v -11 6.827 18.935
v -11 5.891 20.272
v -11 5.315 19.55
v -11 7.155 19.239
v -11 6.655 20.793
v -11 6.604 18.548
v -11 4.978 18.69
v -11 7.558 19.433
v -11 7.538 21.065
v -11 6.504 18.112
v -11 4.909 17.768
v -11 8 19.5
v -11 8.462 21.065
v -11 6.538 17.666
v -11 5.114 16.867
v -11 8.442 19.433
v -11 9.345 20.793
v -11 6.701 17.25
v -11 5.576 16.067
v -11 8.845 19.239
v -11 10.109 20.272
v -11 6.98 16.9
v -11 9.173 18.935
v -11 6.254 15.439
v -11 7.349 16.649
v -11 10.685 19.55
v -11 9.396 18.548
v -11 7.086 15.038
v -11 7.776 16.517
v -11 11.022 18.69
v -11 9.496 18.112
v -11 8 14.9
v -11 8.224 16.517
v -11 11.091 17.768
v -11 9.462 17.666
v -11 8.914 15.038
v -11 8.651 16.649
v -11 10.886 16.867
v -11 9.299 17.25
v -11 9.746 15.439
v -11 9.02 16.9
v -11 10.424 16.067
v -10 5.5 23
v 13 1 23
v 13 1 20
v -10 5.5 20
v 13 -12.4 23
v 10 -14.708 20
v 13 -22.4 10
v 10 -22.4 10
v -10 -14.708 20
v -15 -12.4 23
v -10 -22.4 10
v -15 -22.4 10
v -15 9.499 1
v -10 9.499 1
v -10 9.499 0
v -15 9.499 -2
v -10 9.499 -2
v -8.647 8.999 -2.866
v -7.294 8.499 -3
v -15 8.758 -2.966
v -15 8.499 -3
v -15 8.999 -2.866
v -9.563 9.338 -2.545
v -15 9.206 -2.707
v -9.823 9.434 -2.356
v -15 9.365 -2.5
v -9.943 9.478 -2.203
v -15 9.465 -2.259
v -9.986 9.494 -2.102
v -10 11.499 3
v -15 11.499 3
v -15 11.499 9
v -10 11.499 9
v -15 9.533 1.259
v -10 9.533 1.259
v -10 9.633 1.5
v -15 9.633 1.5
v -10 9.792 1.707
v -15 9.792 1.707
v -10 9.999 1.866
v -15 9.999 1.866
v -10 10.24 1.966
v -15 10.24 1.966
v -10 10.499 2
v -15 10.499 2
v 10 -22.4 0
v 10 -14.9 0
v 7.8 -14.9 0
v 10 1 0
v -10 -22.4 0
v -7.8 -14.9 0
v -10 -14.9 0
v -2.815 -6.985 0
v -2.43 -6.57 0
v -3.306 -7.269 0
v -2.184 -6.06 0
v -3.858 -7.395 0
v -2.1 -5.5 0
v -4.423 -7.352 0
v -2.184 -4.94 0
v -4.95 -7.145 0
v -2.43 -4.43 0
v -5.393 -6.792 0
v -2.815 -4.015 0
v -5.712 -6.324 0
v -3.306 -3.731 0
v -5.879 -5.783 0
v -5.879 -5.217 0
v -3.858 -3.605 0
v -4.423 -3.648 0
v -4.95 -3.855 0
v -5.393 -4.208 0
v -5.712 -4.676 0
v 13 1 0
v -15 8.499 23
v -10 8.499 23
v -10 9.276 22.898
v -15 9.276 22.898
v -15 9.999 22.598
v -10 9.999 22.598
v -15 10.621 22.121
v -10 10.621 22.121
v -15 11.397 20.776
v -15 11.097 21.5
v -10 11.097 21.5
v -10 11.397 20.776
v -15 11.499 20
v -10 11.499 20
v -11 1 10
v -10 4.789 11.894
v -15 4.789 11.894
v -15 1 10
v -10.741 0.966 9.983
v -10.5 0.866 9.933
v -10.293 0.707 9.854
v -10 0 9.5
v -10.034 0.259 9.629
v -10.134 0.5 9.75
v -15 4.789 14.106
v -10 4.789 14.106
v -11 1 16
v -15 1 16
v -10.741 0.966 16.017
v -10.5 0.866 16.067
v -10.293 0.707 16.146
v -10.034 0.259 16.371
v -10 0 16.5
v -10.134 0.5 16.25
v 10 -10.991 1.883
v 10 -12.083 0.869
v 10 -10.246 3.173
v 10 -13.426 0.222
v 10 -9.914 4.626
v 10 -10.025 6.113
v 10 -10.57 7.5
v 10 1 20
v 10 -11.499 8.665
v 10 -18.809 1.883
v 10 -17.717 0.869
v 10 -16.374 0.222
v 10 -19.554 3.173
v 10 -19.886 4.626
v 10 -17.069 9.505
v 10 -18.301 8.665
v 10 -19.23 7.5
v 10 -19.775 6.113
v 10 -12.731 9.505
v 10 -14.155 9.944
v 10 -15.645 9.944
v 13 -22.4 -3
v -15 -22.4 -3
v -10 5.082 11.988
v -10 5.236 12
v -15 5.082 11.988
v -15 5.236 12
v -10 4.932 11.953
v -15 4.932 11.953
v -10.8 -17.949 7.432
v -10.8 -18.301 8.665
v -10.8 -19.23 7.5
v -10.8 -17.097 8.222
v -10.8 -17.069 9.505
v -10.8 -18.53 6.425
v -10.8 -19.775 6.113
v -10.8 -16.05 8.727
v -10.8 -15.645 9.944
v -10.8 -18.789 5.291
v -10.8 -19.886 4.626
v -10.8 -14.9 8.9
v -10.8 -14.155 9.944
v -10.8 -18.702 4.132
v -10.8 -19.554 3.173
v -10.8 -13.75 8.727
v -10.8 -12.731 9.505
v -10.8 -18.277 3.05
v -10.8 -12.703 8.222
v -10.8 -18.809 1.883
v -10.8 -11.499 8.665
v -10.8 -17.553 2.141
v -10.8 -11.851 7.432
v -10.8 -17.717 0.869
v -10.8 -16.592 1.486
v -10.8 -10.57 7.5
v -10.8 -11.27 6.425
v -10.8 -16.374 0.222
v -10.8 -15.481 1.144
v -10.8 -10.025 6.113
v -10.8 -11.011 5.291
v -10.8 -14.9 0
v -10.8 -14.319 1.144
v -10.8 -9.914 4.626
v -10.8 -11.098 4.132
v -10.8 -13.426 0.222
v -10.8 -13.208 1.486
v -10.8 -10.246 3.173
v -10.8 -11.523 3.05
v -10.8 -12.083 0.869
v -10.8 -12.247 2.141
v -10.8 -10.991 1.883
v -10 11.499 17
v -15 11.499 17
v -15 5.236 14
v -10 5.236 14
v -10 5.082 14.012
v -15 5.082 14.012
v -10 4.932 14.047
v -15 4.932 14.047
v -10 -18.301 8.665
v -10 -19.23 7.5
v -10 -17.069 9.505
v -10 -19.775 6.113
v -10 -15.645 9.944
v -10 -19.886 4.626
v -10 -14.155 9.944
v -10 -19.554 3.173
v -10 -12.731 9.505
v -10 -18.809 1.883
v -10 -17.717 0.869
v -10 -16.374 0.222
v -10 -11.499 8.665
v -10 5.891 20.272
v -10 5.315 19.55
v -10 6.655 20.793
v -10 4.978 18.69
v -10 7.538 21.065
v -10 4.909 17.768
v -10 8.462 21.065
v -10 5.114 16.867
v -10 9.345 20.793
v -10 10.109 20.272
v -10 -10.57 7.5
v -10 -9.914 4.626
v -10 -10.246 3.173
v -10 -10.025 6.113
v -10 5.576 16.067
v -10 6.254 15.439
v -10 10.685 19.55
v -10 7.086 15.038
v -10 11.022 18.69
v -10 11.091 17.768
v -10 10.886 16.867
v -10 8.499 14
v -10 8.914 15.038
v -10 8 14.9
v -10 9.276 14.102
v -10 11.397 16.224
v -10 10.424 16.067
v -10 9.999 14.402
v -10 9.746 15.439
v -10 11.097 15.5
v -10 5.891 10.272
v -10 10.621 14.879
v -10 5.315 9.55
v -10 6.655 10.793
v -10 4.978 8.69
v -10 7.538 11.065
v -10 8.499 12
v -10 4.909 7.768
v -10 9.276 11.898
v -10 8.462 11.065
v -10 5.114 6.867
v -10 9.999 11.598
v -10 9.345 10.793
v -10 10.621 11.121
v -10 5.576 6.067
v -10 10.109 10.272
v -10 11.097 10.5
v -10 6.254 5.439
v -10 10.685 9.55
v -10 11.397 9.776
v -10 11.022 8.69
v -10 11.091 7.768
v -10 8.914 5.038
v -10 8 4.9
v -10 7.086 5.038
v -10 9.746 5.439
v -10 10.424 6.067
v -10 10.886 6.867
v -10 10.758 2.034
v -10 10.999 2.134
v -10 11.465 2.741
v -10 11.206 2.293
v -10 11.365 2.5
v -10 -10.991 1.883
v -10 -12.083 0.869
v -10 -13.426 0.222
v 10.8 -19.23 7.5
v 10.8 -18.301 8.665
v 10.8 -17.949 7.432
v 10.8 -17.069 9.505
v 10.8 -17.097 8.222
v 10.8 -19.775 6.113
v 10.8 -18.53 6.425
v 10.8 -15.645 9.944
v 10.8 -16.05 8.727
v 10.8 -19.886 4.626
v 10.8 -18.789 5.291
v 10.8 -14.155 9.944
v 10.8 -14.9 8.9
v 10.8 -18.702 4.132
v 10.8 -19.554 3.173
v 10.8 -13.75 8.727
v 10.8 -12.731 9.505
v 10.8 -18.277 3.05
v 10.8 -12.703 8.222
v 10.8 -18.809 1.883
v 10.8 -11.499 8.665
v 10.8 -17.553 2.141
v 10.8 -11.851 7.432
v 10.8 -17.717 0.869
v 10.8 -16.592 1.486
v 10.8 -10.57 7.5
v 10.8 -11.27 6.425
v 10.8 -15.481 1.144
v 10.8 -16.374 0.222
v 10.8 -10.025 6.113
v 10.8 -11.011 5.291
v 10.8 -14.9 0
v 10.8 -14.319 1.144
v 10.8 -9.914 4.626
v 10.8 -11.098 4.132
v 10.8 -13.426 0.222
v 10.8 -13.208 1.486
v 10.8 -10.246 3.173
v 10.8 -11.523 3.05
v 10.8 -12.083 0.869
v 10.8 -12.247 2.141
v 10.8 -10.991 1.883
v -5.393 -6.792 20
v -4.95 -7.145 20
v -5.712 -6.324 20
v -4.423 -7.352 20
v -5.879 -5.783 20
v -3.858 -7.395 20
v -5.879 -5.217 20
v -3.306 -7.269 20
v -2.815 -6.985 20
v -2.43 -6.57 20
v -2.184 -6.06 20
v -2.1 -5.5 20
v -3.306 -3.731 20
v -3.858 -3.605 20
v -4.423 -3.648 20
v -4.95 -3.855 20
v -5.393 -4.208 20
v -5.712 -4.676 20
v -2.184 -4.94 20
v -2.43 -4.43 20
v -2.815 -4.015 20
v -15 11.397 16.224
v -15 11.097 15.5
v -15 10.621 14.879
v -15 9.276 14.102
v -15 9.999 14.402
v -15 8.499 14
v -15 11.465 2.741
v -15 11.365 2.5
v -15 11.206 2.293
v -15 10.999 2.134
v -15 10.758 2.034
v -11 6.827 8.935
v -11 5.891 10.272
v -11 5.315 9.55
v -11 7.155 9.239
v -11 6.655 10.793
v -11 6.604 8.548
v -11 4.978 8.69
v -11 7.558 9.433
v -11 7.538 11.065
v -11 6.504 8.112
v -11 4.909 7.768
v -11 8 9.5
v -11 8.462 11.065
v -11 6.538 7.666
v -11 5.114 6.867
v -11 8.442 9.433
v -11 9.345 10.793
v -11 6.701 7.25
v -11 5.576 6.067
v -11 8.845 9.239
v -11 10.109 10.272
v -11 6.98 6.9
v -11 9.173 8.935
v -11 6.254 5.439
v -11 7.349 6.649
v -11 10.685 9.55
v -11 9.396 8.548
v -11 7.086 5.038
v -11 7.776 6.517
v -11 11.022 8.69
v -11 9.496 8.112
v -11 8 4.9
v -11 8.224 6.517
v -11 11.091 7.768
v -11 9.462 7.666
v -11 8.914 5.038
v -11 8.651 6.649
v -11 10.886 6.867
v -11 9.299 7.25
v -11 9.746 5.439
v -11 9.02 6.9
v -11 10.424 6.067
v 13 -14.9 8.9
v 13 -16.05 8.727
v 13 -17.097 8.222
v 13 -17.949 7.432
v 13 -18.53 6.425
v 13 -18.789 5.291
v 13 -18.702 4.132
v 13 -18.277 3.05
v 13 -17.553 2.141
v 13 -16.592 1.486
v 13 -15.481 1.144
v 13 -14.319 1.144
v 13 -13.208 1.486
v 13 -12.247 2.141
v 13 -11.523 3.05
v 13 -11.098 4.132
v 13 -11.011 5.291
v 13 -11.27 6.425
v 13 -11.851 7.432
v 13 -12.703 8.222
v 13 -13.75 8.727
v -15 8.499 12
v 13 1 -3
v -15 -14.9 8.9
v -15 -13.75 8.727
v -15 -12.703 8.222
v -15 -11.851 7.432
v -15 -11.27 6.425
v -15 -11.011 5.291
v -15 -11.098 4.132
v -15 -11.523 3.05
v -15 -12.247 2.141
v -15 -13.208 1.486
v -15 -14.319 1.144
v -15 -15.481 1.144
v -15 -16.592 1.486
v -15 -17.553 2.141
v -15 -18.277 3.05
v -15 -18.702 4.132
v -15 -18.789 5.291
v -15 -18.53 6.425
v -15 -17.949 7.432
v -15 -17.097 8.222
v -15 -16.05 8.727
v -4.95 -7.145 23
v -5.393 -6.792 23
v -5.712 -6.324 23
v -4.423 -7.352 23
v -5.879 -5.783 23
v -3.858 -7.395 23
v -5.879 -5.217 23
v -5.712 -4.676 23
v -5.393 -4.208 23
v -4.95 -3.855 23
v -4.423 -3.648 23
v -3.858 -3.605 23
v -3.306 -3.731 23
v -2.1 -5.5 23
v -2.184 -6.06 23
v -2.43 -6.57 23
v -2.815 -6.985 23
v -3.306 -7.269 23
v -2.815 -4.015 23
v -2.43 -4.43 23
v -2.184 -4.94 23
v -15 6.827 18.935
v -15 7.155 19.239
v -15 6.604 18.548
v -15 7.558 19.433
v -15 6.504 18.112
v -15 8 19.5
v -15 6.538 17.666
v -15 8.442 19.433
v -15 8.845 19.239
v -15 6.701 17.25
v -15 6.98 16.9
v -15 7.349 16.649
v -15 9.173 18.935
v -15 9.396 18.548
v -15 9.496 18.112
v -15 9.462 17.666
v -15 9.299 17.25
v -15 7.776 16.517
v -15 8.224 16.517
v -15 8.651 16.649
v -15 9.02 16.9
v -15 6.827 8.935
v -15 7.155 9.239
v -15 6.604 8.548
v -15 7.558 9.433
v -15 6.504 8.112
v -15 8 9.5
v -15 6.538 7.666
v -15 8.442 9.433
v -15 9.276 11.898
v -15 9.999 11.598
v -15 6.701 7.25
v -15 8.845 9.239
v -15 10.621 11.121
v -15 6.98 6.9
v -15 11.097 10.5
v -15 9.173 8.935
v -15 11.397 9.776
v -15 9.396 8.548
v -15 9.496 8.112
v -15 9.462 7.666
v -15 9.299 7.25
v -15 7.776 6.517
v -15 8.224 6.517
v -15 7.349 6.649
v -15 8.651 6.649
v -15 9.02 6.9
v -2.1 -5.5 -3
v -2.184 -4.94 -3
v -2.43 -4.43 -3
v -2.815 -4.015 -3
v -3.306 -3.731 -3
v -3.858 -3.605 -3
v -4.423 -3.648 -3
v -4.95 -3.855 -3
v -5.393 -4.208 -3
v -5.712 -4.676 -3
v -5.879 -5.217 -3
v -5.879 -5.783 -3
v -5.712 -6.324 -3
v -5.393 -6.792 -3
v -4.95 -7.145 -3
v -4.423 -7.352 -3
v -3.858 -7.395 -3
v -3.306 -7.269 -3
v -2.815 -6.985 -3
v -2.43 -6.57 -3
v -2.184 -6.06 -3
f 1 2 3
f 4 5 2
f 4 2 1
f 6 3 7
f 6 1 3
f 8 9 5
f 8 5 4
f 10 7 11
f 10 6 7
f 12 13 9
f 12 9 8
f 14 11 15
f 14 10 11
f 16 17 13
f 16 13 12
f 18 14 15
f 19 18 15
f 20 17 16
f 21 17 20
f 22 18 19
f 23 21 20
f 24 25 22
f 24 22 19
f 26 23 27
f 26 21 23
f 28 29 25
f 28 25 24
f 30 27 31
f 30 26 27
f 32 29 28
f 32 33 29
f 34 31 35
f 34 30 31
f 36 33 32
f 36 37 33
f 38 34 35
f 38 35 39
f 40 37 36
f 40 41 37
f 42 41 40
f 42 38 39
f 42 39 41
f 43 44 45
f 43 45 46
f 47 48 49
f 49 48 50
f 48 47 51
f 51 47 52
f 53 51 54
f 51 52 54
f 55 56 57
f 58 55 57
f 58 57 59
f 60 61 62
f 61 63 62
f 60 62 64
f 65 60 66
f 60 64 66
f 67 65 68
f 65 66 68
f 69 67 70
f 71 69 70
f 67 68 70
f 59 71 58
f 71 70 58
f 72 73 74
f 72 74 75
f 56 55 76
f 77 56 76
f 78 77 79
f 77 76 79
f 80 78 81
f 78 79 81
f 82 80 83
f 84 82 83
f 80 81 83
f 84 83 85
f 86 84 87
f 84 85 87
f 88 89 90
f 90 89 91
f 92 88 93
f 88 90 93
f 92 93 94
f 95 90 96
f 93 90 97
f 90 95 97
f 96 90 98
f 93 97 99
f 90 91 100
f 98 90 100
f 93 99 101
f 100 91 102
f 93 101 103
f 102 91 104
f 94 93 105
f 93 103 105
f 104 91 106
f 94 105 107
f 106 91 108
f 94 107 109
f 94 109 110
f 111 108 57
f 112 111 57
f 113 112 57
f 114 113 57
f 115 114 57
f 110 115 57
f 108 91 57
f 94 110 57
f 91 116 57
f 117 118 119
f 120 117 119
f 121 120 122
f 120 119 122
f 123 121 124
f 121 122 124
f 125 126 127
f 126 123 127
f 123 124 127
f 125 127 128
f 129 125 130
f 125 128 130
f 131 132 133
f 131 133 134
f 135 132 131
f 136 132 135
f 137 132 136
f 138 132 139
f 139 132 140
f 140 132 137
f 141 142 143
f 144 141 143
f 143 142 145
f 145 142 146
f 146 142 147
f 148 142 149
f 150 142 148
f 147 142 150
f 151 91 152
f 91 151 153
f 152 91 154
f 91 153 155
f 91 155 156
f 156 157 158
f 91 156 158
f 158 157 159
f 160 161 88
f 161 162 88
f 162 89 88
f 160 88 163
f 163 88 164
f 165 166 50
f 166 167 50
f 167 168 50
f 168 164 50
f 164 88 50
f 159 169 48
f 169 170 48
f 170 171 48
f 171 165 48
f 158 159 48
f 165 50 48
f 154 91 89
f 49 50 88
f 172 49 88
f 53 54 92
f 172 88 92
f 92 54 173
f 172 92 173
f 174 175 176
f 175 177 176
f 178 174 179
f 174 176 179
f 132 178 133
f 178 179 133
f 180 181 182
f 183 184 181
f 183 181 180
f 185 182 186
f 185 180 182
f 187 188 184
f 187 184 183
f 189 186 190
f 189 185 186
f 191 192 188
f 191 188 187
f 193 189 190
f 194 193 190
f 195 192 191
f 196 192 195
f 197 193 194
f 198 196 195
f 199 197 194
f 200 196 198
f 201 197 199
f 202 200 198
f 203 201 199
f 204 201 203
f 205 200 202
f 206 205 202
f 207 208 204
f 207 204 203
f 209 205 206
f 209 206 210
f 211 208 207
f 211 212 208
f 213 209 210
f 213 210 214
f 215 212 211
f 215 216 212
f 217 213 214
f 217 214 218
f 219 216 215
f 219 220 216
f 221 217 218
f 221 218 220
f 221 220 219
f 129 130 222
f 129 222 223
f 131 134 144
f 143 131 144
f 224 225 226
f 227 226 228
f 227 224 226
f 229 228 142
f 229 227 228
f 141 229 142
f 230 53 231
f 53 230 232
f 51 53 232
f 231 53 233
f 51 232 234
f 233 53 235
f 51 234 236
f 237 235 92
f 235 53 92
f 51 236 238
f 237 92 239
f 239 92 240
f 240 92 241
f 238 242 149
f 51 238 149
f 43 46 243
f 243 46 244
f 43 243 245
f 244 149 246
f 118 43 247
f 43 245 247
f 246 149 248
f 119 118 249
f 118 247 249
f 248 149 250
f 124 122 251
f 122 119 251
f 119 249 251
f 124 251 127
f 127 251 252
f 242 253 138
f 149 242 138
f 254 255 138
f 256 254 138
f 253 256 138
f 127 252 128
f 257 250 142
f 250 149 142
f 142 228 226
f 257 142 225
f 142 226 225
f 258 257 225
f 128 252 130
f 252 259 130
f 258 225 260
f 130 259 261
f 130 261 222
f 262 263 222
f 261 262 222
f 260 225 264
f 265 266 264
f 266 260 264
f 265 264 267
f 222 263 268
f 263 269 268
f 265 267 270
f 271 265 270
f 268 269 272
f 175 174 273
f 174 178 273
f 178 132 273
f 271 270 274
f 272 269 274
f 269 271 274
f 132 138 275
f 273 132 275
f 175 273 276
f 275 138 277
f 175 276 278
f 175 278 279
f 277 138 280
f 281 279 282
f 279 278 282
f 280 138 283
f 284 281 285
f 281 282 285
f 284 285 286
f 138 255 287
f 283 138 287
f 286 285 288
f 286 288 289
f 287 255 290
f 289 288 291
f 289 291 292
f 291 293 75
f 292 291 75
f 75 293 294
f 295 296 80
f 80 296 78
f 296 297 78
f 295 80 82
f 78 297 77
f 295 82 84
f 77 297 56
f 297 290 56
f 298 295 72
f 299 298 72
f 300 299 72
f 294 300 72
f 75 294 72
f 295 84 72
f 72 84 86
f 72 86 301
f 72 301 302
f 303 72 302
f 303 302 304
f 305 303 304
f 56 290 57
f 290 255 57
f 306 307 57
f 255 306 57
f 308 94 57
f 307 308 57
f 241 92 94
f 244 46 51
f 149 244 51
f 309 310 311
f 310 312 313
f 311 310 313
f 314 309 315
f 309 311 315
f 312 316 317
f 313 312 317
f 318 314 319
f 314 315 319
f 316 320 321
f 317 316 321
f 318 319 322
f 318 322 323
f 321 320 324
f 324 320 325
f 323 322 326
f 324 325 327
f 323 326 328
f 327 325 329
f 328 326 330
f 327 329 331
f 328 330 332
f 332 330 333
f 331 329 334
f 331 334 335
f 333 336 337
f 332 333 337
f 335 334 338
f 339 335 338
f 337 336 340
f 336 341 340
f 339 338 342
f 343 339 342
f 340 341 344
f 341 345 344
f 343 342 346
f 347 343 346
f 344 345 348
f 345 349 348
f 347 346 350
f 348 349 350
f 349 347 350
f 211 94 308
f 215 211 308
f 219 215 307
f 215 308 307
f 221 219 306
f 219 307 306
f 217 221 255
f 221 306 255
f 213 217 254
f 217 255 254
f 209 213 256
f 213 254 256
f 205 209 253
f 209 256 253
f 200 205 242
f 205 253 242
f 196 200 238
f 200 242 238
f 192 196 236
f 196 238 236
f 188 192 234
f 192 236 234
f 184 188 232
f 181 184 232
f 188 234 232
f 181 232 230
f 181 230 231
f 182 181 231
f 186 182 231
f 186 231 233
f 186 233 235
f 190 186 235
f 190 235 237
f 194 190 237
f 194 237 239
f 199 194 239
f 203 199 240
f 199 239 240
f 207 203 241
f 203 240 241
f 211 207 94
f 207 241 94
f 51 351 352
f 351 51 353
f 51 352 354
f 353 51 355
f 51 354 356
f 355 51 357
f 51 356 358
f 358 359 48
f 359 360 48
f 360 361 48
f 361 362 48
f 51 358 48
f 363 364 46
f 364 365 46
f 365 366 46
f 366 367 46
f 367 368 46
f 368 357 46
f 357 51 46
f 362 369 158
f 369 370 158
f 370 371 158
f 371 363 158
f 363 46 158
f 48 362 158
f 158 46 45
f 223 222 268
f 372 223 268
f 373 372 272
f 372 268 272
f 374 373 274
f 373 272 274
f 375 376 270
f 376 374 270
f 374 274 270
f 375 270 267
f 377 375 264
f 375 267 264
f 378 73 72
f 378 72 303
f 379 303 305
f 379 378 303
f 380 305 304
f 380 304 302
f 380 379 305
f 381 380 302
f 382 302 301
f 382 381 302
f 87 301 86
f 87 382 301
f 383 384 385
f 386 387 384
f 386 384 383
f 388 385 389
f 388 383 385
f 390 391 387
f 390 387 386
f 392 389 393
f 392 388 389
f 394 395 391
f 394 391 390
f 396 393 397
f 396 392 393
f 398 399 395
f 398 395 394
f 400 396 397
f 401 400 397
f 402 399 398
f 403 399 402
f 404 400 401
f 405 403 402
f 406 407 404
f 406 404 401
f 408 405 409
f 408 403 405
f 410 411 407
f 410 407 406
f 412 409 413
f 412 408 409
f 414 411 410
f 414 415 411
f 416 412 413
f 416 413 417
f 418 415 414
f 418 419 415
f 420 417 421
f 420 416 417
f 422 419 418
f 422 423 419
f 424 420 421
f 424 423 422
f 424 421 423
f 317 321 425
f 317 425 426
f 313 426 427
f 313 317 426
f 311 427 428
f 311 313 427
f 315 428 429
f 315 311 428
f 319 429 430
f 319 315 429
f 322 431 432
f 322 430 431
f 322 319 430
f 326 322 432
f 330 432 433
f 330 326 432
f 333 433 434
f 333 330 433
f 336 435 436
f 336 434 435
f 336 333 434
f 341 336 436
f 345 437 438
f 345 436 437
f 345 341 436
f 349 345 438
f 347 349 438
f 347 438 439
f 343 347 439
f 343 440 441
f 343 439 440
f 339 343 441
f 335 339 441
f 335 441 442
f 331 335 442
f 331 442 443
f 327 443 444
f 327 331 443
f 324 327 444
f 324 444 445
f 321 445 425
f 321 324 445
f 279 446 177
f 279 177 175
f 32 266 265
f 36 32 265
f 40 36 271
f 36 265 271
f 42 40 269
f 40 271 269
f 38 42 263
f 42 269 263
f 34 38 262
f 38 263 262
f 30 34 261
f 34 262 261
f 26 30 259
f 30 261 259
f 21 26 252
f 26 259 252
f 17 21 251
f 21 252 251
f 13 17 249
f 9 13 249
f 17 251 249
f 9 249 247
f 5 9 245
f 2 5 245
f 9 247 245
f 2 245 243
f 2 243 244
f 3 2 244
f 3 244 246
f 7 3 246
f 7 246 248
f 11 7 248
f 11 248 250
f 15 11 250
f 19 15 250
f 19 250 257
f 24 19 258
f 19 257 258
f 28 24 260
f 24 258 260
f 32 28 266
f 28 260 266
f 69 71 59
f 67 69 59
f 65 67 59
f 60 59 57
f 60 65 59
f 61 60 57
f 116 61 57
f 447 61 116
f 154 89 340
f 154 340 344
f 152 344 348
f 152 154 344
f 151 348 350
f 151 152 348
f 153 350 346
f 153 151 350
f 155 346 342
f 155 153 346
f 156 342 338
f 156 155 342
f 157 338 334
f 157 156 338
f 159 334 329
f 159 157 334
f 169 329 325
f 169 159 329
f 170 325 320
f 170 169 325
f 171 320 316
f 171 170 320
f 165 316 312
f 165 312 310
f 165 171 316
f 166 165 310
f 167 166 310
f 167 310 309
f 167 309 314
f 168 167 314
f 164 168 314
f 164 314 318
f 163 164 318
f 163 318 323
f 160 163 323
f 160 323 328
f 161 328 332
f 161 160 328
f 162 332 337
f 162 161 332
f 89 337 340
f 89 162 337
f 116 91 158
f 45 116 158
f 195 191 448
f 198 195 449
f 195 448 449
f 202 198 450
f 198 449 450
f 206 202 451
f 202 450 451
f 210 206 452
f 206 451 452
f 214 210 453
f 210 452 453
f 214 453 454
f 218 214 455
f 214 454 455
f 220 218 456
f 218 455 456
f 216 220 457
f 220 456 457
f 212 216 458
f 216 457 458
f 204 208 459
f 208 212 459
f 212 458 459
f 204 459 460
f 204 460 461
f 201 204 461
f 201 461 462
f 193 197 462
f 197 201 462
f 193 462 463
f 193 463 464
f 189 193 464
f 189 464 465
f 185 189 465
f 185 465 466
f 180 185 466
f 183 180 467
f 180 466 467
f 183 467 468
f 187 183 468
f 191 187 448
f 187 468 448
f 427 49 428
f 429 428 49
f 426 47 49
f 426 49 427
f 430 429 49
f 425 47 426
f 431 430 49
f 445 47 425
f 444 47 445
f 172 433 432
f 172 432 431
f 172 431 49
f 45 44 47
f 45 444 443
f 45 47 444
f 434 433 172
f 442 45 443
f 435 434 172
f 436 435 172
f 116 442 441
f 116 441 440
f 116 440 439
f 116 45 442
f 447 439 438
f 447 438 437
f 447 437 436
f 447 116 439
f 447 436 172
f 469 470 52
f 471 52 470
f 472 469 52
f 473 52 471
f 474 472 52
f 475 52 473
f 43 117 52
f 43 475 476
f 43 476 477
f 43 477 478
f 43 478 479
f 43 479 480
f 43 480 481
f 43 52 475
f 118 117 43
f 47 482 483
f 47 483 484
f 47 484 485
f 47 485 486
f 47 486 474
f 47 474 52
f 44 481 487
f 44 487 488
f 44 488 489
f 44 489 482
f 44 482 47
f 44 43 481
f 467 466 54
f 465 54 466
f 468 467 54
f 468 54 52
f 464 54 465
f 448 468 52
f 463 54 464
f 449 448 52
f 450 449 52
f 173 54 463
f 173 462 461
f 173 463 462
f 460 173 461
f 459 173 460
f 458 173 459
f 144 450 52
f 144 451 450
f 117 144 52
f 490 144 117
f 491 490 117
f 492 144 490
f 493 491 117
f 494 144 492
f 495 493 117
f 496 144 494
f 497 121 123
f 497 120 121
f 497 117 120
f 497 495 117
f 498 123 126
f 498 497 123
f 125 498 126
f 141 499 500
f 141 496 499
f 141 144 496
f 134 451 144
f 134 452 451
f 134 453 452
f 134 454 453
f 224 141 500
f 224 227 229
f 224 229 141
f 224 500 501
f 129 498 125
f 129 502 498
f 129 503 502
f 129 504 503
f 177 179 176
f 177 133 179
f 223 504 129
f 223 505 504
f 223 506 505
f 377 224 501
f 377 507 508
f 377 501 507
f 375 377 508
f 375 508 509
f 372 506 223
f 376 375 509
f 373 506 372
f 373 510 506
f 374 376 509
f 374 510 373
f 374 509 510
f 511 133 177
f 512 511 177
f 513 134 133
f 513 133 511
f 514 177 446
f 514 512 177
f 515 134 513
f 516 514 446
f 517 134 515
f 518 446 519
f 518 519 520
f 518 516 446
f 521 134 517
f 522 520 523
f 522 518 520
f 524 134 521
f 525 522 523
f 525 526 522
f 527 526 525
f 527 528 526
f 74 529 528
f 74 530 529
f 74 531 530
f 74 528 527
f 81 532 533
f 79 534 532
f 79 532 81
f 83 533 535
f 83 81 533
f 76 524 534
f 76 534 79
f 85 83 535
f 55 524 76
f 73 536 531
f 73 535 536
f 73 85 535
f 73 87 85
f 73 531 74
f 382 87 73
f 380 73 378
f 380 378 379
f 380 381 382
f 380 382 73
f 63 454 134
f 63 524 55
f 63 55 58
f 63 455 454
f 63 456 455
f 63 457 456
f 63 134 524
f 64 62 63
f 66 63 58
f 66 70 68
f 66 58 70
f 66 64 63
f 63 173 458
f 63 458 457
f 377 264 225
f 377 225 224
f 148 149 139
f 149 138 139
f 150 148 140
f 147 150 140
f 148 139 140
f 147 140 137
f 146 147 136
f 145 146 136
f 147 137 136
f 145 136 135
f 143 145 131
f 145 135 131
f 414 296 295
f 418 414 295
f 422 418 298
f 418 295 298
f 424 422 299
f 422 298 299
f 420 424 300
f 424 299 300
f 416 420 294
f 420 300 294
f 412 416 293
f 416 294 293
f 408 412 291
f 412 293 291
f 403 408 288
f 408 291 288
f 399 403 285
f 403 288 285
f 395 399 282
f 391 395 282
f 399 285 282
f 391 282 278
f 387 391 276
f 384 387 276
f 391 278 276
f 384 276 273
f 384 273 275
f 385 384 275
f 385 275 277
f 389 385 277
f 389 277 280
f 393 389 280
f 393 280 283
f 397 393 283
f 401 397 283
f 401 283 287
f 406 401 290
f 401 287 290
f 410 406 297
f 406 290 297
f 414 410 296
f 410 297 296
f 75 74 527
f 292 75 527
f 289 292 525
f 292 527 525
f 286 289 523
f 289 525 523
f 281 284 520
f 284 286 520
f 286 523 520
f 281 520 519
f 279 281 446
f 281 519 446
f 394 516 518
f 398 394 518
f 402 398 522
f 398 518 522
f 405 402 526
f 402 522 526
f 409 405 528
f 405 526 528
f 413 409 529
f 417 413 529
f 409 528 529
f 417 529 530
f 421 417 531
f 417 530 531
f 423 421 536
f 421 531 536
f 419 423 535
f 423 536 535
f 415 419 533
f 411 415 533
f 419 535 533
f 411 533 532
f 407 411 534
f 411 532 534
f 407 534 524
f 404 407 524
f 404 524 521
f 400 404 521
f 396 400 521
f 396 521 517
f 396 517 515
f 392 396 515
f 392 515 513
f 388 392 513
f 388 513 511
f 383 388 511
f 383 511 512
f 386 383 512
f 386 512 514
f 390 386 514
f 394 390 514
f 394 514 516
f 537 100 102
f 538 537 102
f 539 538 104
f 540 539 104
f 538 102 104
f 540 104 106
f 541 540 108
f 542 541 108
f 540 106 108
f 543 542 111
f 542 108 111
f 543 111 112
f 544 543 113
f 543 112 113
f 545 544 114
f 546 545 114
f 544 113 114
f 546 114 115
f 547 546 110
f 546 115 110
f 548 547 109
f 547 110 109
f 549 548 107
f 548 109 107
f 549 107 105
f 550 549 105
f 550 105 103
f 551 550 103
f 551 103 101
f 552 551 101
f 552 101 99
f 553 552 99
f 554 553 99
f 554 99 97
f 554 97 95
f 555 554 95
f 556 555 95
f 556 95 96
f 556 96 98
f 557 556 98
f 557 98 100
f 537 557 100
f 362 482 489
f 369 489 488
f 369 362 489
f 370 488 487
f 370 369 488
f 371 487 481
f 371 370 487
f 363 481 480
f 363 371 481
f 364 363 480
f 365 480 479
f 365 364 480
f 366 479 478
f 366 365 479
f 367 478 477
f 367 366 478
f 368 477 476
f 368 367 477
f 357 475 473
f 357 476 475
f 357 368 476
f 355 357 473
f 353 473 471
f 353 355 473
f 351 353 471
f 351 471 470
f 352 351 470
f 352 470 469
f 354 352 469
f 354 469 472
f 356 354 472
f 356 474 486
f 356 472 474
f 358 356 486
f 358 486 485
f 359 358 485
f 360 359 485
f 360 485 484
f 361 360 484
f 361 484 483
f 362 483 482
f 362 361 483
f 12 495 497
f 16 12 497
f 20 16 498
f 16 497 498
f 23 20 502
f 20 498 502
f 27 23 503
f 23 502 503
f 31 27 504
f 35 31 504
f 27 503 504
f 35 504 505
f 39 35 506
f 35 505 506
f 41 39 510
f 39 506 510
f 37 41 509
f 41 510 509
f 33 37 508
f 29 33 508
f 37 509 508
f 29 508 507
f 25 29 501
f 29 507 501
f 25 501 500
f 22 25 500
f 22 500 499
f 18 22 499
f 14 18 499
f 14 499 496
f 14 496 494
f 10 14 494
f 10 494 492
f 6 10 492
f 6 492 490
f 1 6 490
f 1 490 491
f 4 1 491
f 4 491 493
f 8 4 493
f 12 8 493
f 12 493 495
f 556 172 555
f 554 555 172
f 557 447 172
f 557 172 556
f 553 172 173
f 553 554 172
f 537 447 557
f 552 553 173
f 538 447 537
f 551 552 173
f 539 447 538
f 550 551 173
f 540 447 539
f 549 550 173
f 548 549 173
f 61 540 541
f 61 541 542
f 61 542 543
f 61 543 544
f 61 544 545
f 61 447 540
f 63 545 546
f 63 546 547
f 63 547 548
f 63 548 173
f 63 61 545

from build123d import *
from build123d.topology import SkipClean

# Parameters (mm, degrees)
SKETCH_1_W           = 20
SKETCH_1_H           = 57.76596942167697
EXTRUDE_1_DEPTH      = 3
EXTRUDE_2_DEPTH      = 3
CUT_EXTRUDE_1_DEPTH  = 6
SKETCH_8_R           = 4.48
CUT_EXTRUDE_2_DEPTH  = 0.8
SKETCH_9_R           = 1.9
CUT_EXTRUDE_3_DEPTH  = 3.8
SKETCH_12_W          = 26.000000000000007
SKETCH_12_H          = 35.36596942167698
CUT_EXTRUDE_4_DEPTH  = 36.00000000000001
CUT_EXTRUDE_8_DEPTH  = 28.00000000000001
SKETCH_23_W          = 26.000000000000004
SKETCH_23_H          = 26
SKETCH_23_W_2        = 20
SKETCH_23_H_2        = 19.999999999999993
EXTRUDE_7_DEPTH      = 4
SKETCH_24_W          = 20
SKETCH_24_H          = 19.999999999999993
EXTRUDE_8_DEPTH      = 3
SKETCH_25_W          = 5.000000000000002
SKETCH_25_H          = 16
SKETCH_25_R          = 1.4999999999999991
EXTRUDE_9_DEPTH      = 3
FILLET_1_R           = 1
CUT_EXTRUDE_9_DEPTH  = 3
SKETCH_27_R          = 1.4999999999999987
CUT_EXTRUDE_10_DEPTH = 3
SKETCH_28_W          = 20
SKETCH_28_H          = 19.999999999999993
CUT_EXTRUDE_11_DEPTH = 10
CUT_EXTRUDE_12_DEPTH = 42.00000000000001
SKETCH_31_R          = 4.48
SKETCH_31_R_2        = 3.98
EXTRUDE_13_DEPTH     = 0.8
SKETCH_32_R          = 5.000000000000001
SKETCH_32_R_2        = 3.98
CUT_EXTRUDE_13_DEPTH = 0.8
SKETCH_33_R          = 4.48
EXTRUDE_14_DEPTH     = 3
SKETCH_36_R          = 5.000000000000001
CUT_EXTRUDE_14_DEPTH = 3
SKETCH_37_R          = 3.98
SKETCH_37_R_2        = 3.900000000000001
EXTRUDE_17_DEPTH     = 0.8
SKETCH_38_R          = 1.5000000000000009
EXTRUDE_18_DEPTH     = 3
SKETCH_39_W          = 4.187599959799879
SKETCH_39_H          = 1.3608825238343043
EXTRUDE_19_DEPTH     = 3
EXTRUDE_START        = 2
SKETCH_43_R          = 1.5000000000000024
SKETCH_43_R_2        = 1.5000000000000009
SKETCH_43_R_3        = 3.900000000000002
EXTRUDE_22_DEPTH     = 2
SKETCH_44_W          = 5
SKETCH_44_H          = 9.399224841629362
EXTRUDE_23_DEPTH     = 2
EXTRUDE_24_DEPTH     = 3
SKETCH_47_W          = 5
SKETCH_47_H          = 9.399224841629362
EXTRUDE_25_DEPTH     = 8
SKETCH_51_W          = 5
SKETCH_51_H          = 14
SKETCH_51_H_2        = 7.999999999999998
EXTRUDE_28_DEPTH     = 1.1
CUT_EXTRUDE_16_DEPTH = 6.1000000000000005
FILLET_START         = -16
FILLET_9_DEPTH       = 7
FILLET_START_2       = -15
FILLET_9_2_DEPTH     = 5
EXTRUDE_30_DEPTH     = 3
FILLET_10_R          = 1
SKETCH_57_W          = 5
SKETCH_57_H          = 10.499224841629362
EXTRUDE_31_DEPTH     = 1
SKETCH_58_W          = 5
SKETCH_58_H          = 10.499224841629362
EXTRUDE_32_DEPTH     = 1
FILLET_11_R          = 3
CUT_EXTRUDE_19_DEPTH = 6.500000000000001
FILLET_14_R          = 1
FILLET_19_R          = 1
SKETCH_62_R          = 3.1000000000000005
CUT_EXTRUDE_20_DEPTH = 1


with BuildPart() as part:
    # 草图1 → 凸台-拉伸1 (new body)
    with BuildSketch(Plane.XY):
        with Locations((0, -28.882984710838485)):
            Rectangle(SKETCH_1_W, SKETCH_1_H)
    extrude_1 = extrude(amount=-EXTRUDE_1_DEPTH)

    # 草图2 → 凸台-拉伸2 (add)
    with BuildSketch(Plane.ZY.offset(10)):
        Polygon((-3, -1.22e-15), (23, 0), (23.000000000000007, -57.76596942167697), (-3, -57.76596942167697), align=None)
    extrude_2 = extrude(amount=EXTRUDE_2_DEPTH)

    # 草图7 → 切除-拉伸1 (cut)
    with BuildSketch(Plane(origin=(-10, 0, 0), x_dir=(0, 0, -1), z_dir=(1, 0, 0))):
        with BuildLine():
            ThreePointArc((-1.0999999999999996, -14.899999999999997), (-5, -10.999999999999996), (-8.9, -14.899999999999997))
            Line((-8.9, -14.899999999999997), (-1.1000000000000014, -14.899999999999997))
        make_face()
        with BuildLine():
            Line((-1.1000000000000014, -14.899999999999997), (-8.9, -14.899999999999997))
            ThreePointArc((-8.9, -14.899999999999997), (-5.000000000000001, -18.799999999999997), (-1.0999999999999996, -14.899999999999999))
        make_face()
    cut_extrude_1 = extrude(amount=-CUT_EXTRUDE_1_DEPTH, mode=Mode.SUBTRACT)

    # 草图8 → 切除-拉伸2 (cut)
    with BuildSketch(Plane.ZY.offset(13.000000000000002)):
        with Locations((5, -14.899999999999997)):
            Circle(SKETCH_8_R)
    cut_extrude_2 = extrude(amount=-CUT_EXTRUDE_2_DEPTH, mode=Mode.SUBTRACT)

    # 草图9 → 切除-拉伸3 (cut)
    with BuildSketch(Plane.XY):
        with Locations((-4, -5.499999999999998)):
            Circle(SKETCH_9_R)
    cut_extrude_3 = extrude(amount=-CUT_EXTRUDE_3_DEPTH, mode=Mode.SUBTRACT)

    # 镜向1: 凸台-拉伸2 across plane
    add(extrude_2.mirror(Plane(origin=(0, 0, 0), x_dir=(0, 0, 1), z_dir=(1, 0, 0))))

    # 镜向2: 切除-拉伸1, 切除-拉伸2 across plane
    add(cut_extrude_1.mirror(Plane(origin=(0, 0, 0), x_dir=(0, 0, 1), z_dir=(1, 0, 0))), mode=Mode.SUBTRACT)
    add(cut_extrude_2.mirror(Plane(origin=(0, 0, 0), x_dir=(0, 0, 1), z_dir=(1, 0, 0))), mode=Mode.SUBTRACT)

    # 镜向3: 凸台-拉伸1 across plane
    add(extrude_1.mirror(Plane.XY.offset(10)))

    # 镜向5: 切除-拉伸3 across plane
    add(cut_extrude_3.mirror(Plane.XY.offset(10)), mode=Mode.SUBTRACT)

    # 草图12 → 切除-拉伸4 (cut)
    with BuildSketch(Plane(origin=(13.000000000000002, 0, 0), x_dir=(0, 0, -1), z_dir=(1, 0, 0))):
        with Locations((-10.000000000000004, -40.08298471083848)):
            Rectangle(SKETCH_12_W, SKETCH_12_H)
    extrude(amount=-CUT_EXTRUDE_4_DEPTH, mode=Mode.SUBTRACT)

    # 草图22 → 切除-拉伸8 (cut)
    with BuildSketch(Plane(origin=(13.000000000000002, 0, 0), x_dir=(0, 0, -1), z_dir=(1, 0, 0))):
        Polygon((-23.000000000000007, -12.399999999999997), (-23.000000000000007, -22.399999999999995), (-10.000000000000007, -22.399999999999995), align=None)
    extrude(amount=-CUT_EXTRUDE_8_DEPTH, mode=Mode.SUBTRACT)

    # 草图23 → 凸台-拉伸7 (add)
    with BuildSketch(Plane(origin=(0, 0, 0), x_dir=(1, 0, 0), z_dir=(0, 1, 0))):
        with Locations((0, -10)):
            Rectangle(SKETCH_23_W, SKETCH_23_H)
        with Locations((0, -9.999999999999996)):
            Rectangle(SKETCH_23_W_2, SKETCH_23_H_2, mode=Mode.SUBTRACT)
    extrude(amount=EXTRUDE_7_DEPTH)

    # 草图24 → 凸台-拉伸8 (add)
    with BuildSketch(Plane(origin=(0, 4, 0), x_dir=(1, 0, 0), z_dir=(0, 1, 0))):
        with Locations((0, -9.999999999999996)):
            Rectangle(SKETCH_24_W, SKETCH_24_H)
    extrude(amount=-EXTRUDE_8_DEPTH)

    # 草图25 → 凸台-拉伸9 (add)
    with BuildSketch(Plane(origin=(0, 4, 0), x_dir=(1, 0, 0), z_dir=(0, 1, 0))):
        with Locations((15.500000000000004, -15)):
            Rectangle(SKETCH_25_W, SKETCH_25_H)
        with Locations(Location((15.500000000000002, -20.23329325648959, 0), (0, 0, 270))):
            Circle(SKETCH_25_R, mode=Mode.SUBTRACT)
        with Locations(Location((15.500000000000002, -10.23329325648959, 0), (0, 0, 270))):
            Circle(SKETCH_25_R, mode=Mode.SUBTRACT)
    extrude(amount=-EXTRUDE_9_DEPTH)

    # 圆角1
    fillet_1_edges = [part.edges().sort_by_distance(p)[0] for p in [
        (18.000000000000004, 1, 15),
    ]]
    fillet(fillet_1_edges, radius=FILLET_1_R)

    # 草图26 → 切除-拉伸9 (cut)
    with BuildSketch(Plane(origin=(13.000000000000002, 0, 0), x_dir=(0, 0, -1), z_dir=(1, 0, 0))):
        with BuildLine():
            Line((-16, 1.0000000000000004), (-13.999999999999998, 1.0000000000000004))
            ThreePointArc((-13.999999999999998, 1.0000000000000004), (-15, 0), (-16, 1.0000000000000004))
        make_face()
    extrude(amount=-CUT_EXTRUDE_9_DEPTH, mode=Mode.SUBTRACT)

    # 草图27 → 切除-拉伸10 (cut)
    with BuildSketch(Plane(origin=(0, 4, 0), x_dir=(1, 0, 0), z_dir=(0, 1, 0))):
        with Locations(Location((7.500000000000002, -15.233293256489592, 0), (0, 0, 270))):
            Circle(SKETCH_27_R)
    extrude(amount=-CUT_EXTRUDE_10_DEPTH, mode=Mode.SUBTRACT)

    # 草图28 → 切除-拉伸11 (cut)
    with BuildSketch(Plane.XZ.offset(-1)):
        with Locations((0, 9.999999999999996)):
            Rectangle(SKETCH_28_W, SKETCH_28_H)
    extrude(amount=-CUT_EXTRUDE_11_DEPTH, mode=Mode.SUBTRACT)

    # 草图29 → 切除-拉伸12 (cut)
    with BuildSketch(Plane(origin=(0, 0, -3), x_dir=(-1, 0, 0), z_dir=(0, 0, -1))):
        Polygon((13.000000000000002, 4), (-24.68163228941081, 4), (-24.68163228941081, 0.9999999999999957), (13.000000000000002, 1.0000000000000002), align=None)
    extrude(amount=-CUT_EXTRUDE_12_DEPTH, mode=Mode.SUBTRACT)

    # 草图31 → 凸台-拉伸13 (add)
    with BuildSketch(Plane.ZY.offset(12.200000000000001)):
        with Locations((5, -14.899999999999997)):
            Circle(SKETCH_31_R)
        with Locations((5, -14.899999999999997)):
            Circle(SKETCH_31_R_2, mode=Mode.SUBTRACT)
    extrude(amount=EXTRUDE_13_DEPTH)

    # 草图32 → 切除-拉伸13 (cut)
    with BuildSketch(Plane(origin=(-10, 0, 0), x_dir=(0, 0, -1), z_dir=(1, 0, 0))):
        with Locations((-5, -14.899999999999997)):
            Circle(SKETCH_32_R)
        with Locations(Location((-5, -14.899999999999997, 0), (0, 0, 180))):
            Circle(SKETCH_32_R_2, mode=Mode.SUBTRACT)
    cut_extrude_13 = extrude(amount=-CUT_EXTRUDE_13_DEPTH, mode=Mode.SUBTRACT)

    # 草图33 → 凸台-拉伸14 (add)
    with BuildSketch(Plane(origin=(13.000000000000002, 0, 0), x_dir=(0, 0, -1), z_dir=(1, 0, 0))):
        with Locations((-5, -14.899999999999997)):
            Circle(SKETCH_33_R)
    extrude(amount=-EXTRUDE_14_DEPTH)

    # 镜向6: 切除-拉伸1, 切除-拉伸13 across plane
    add(cut_extrude_1.mirror(Plane(origin=(0, 0, 0), x_dir=(0, 0, 1), z_dir=(1, 0, 0))), mode=Mode.SUBTRACT)
    add(cut_extrude_13.mirror(Plane(origin=(0, 0, 0), x_dir=(0, 0, 1), z_dir=(1, 0, 0))), mode=Mode.SUBTRACT)

    # 草图36 → 切除-拉伸14 (cut)
    with BuildSketch(Plane(origin=(-10.8, 0, 0), x_dir=(0, 0, -1), z_dir=(1, 0, 0))):
        with Locations((-5, -14.899999999999997)):
            Circle(SKETCH_36_R)
    cut_extrude_14 = extrude(amount=CUT_EXTRUDE_14_DEPTH, mode=Mode.SUBTRACT)

    # 镜向7: 切除-拉伸14 across plane
    add(cut_extrude_14.mirror(Plane(origin=(0, 0, 0), x_dir=(0, 0, 1), z_dir=(1, 0, 0))), mode=Mode.SUBTRACT)

    # 草图37 → 凸台-拉伸17 (add)
    with SkipClean():  # the faces are left unmerged after this step: merging them gives an invalid solid
        with BuildSketch(Plane.ZY.offset(12.200000000000001)):
            with Locations((5, -14.899999999999997)):
                Circle(SKETCH_37_R)
            with Locations((5, -14.899999999999997)):
                Circle(SKETCH_37_R_2, mode=Mode.SUBTRACT)
        extrude(amount=EXTRUDE_17_DEPTH)

    # 草图38 → 凸台-拉伸18 (add)
    # profile 1 of 2: a face of its own
    with SkipClean():  # the faces are left unmerged after this step: merging them gives an invalid solid
        with BuildSketch(Plane.ZY.offset(13.000000000000002)):
            Polygon((15, 10.399224841629362), (15, 1), (20.999999999999996, 1.0000000000000002), (20.999999999999996, 10.399224841629362), align=None)
            with Locations((18, 8)):
                Circle(SKETCH_38_R, mode=Mode.SUBTRACT)
        # profile 2 of 2: a face of its own
        with BuildSketch(Plane.ZY.offset(13.000000000000002)):
            Polygon((11, 1), (11, 10.399224841629362), (5.000000000000001, 10.399224841629362), (5.000000000000001, 1.0000000000000002), align=None)
            with Locations((8, 8)):
                Circle(SKETCH_38_R, mode=Mode.SUBTRACT)
        extrude(amount=-EXTRUDE_18_DEPTH)

    # 草图39 → 凸台-拉伸19 (add)
    with SkipClean():  # the faces are left unmerged after this step: merging them gives an invalid solid
        with BuildSketch(Plane(origin=(13.000000000000002, 0, 0), x_dir=(0, 0, -1), z_dir=(1, 0, 0))):
            with Locations((-15.28799119011226, 0.3195587380828476)):
                Rectangle(SKETCH_39_W, SKETCH_39_H)
        extrude(amount=-EXTRUDE_19_DEPTH)

    # 草图43 → 凸台-拉伸22 (add)
    with BuildSketch(Plane.ZY.offset(13.000000000000002).offset(EXTRUDE_START)):
        Polygon((-3, 1.0000000000000002), (5.000000000000004, 1.0000000000000002), (5.000000000000001, 10.399224841629362), (11, 10.399224841629362), (11, 1.0000000000000002), (15, 1.0000000000000002), (15, 10.399224841629362), (20.999999999999996, 10.399224841629362), (20.999999999999996, 1.0000000000000002), (23.000000000000007, 1.0000000000000002), (23.000000000000007, -12.399999999999997), (10.000000000000009, -22.399999999999995), (-3, -22.399999999999995), align=None)
        with Locations((8, 8)):
            Circle(SKETCH_43_R, mode=Mode.SUBTRACT)
        with Locations((18, 8)):
            Circle(SKETCH_43_R_2, mode=Mode.SUBTRACT)
        with Locations((5, -14.899999999999997)):
            Circle(SKETCH_43_R_3, mode=Mode.SUBTRACT)
    extrude(amount=-EXTRUDE_22_DEPTH)

    # 草图44 → 凸台-拉伸23 (add)
    with BuildSketch(Plane.XY.offset(20.999999999999996)):
        with Locations((-12.500000000000002, 5.699612420814681)):
            Rectangle(SKETCH_44_W, SKETCH_44_H)
    extrude(amount=EXTRUDE_23_DEPTH)

    # 草图45 → 凸台-拉伸24 (add)
    with BuildSketch(Plane.XY.offset(23)):
        Polygon((-10.000000000000002, 0.9999999999999981), (13.000000000000002, 0.9999999999999943), (-10.000000000000002, 5.499999999999998), align=None)
    extrude(amount=-EXTRUDE_24_DEPTH)

    # 草图47 → 凸台-拉伸25 (add)
    with BuildSketch(Plane(origin=(0, 0, 5.000000000000001), x_dir=(-1, 0, 0), z_dir=(0, 0, -1))):
        with Locations((12.500000000000002, 5.699612420814681)):
            Rectangle(SKETCH_47_W, SKETCH_47_H)
    extrude(amount=EXTRUDE_25_DEPTH)

    # 草图51 → 凸台-拉伸28 (add)
    with BuildSketch(Plane(origin=(0, 10.399224841629362, 0), x_dir=(1, 0, 0), z_dir=(0, 1, 0))):
        with Locations((-12.500000000000002, -4)):
            Rectangle(SKETCH_51_W, SKETCH_51_H)
        with Locations((-12.500000000000002, -19)):
            Rectangle(SKETCH_51_W, SKETCH_51_H_2)
    extrude(amount=EXTRUDE_28_DEPTH)

    # 草图53 → 切除-拉伸16 (cut)
    with BuildSketch(Plane(origin=(-10, 0, 0), x_dir=(0, 0, -1), z_dir=(1, 0, 0))):
        Polygon((2.999999999999999, 11.499224841629362), (-2.000000000000001, 11.499224841629362), (-2.0000000000000004, 9.49922484162936), (2.999999999999999, 9.499224841629362), align=None)
    extrude(amount=-CUT_EXTRUDE_16_DEPTH, mode=Mode.SUBTRACT)

    # 圆角9: read off the stored shape, not the designer's step
    # 圆角9 outline → 圆角9 (cut)
    with BuildSketch(Plane.YZ.offset(FILLET_START)):
        with BuildLine():
            Line((11.499224842, 2), (11.499224842, 3))
            ThreePointArc((11.499224842, 3), (11.206331623, 2.292893219), (10.499224842, 2))
            Line((10.499224842, 2), (11.499224842, 2))
        make_face()
    extrude(amount=FILLET_9_DEPTH, mode=Mode.SUBTRACT)

    # Fillet 9 2 outline → Fillet 9 2 (add)
    with BuildSketch(Plane.YZ.offset(FILLET_START_2)):
        with BuildLine():
            ThreePointArc((9.499224842, 1), (9.79211806, 1.707106782), (10.499224842, 2))
            Line((10.499224842, 2), (9.499224842, 2))
            Line((9.499224842, 2), (9.499224842, 1))
        make_face()
    extrude(amount=FILLET_9_2_DEPTH)

    # 草图54 → 凸台-拉伸30 (add)
    with BuildSketch(Plane(origin=(0, 0, -3), x_dir=(-1, 0, 0), z_dir=(0, 0, -1))):
        Polygon((-13.000000000000002, 0.9999999999999972), (10.000000000000002, 1.0000000000000002), (10, 9.499224841629362), align=None)
    extrude(amount=-EXTRUDE_30_DEPTH)

    # 圆角10
    fillet_10_edges = [part.edges().sort_by_distance(p)[0] for p in [
        (-12.5, 9.499224841629362, -2.999999999999999),
    ]]
    fillet(fillet_10_edges, radius=FILLET_10_R)

    # 草图57 → 凸台-拉伸31 (add)
    with BuildSketch(Plane(origin=(0, 0, 15), x_dir=(-1, 0, 0), z_dir=(0, 0, -1))):
        with Locations((12.500000000000002, 6.249612420814681)):
            Rectangle(SKETCH_57_W, SKETCH_57_H)
    extrude(amount=EXTRUDE_31_DEPTH)

    # 草图58 → 凸台-拉伸32 (add)
    with BuildSketch(Plane.XY.offset(11)):
        with Locations((-12.500000000000002, 6.249612420814681)):
            Rectangle(SKETCH_58_W, SKETCH_58_H)
    extrude(amount=EXTRUDE_32_DEPTH)

    # 圆角11
    # the kernel refuses this fillet: 3 mm, written as the material it takes off along each edge
    with BuildSketch(Plane(origin=(-2.5000000000000018, 11.499224841629362, 23), x_dir=(0, -1, 0), z_dir=(-1, 0, 0)), Plane(origin=(-2.5000000000000018, 11.499224841629362, 14), x_dir=(0, 0, 1), z_dir=(-1, 0, 0))) as fillet_11_piece_1:
        with BuildLine():
            CenterArc((FILLET_11_R, -FILLET_11_R), FILLET_11_R, 90, 90)
            Line((0, -FILLET_11_R), (0, 0))
            Line((0, 0), (FILLET_11_R, 0))
        make_face()
    extrude(amount=20, mode=Mode.SUBTRACT)
    with BuildSketch(Plane(origin=(-22.5, 11.499224841629362, 12), x_dir=(0, -1, 0), z_dir=(1, 0, 0))) as fillet_11_piece_2:
        with BuildLine():
            CenterArc((FILLET_11_R, FILLET_11_R), FILLET_11_R, 180, 90)
            Line((0, FILLET_11_R), (0, 0))
            Line((0, 0), (FILLET_11_R, 0))
        make_face()
    extrude(amount=20, mode=Mode.SUBTRACT)

    # 草图61 → 切除-拉伸19 (cut)
    with BuildSketch(Plane(origin=(-10, 0, 0), x_dir=(0, 0, -1), z_dir=(1, 0, 0))):
        Polygon((-12, 1.0000000000000002), (-12, 5), (-10, 1.0000000000000007), align=None)
        Polygon((-13.999999999999998, 1.0000000000000002), (-13.999999999999998, 5), (-16, 0.9999999999999998), align=None)
    extrude(amount=-CUT_EXTRUDE_19_DEPTH, mode=Mode.SUBTRACT)

    # 圆角14
    fillet_14_edges = [part.edges().sort_by_distance(p)[0] for p in [
        (-10, 1.0000000000000002, 13),
    ]]
    fillet(fillet_14_edges, radius=FILLET_14_R)

    # 圆角19
    fillet_19_edges = [part.edges().sort_by_distance(p)[0] for p in [
        (-12.5, 5, 12),
        (-12.5, 5, 13.999999999999998),
    ]]
    fillet(fillet_19_edges, radius=FILLET_19_R)

    # 草图62 → 切除-拉伸20 (cut)
    with BuildSketch(Plane(origin=(-10, 0, 0), x_dir=(0, 0, -1), z_dir=(1, 0, 0))):
        with Locations((-18, 8)):
            Circle(SKETCH_62_R)
        with Locations((-8, 8)):
            Circle(SKETCH_62_R)
    extrude(amount=-CUT_EXTRUDE_20_DEPTH, mode=Mode.SUBTRACT)


solid = part.part
